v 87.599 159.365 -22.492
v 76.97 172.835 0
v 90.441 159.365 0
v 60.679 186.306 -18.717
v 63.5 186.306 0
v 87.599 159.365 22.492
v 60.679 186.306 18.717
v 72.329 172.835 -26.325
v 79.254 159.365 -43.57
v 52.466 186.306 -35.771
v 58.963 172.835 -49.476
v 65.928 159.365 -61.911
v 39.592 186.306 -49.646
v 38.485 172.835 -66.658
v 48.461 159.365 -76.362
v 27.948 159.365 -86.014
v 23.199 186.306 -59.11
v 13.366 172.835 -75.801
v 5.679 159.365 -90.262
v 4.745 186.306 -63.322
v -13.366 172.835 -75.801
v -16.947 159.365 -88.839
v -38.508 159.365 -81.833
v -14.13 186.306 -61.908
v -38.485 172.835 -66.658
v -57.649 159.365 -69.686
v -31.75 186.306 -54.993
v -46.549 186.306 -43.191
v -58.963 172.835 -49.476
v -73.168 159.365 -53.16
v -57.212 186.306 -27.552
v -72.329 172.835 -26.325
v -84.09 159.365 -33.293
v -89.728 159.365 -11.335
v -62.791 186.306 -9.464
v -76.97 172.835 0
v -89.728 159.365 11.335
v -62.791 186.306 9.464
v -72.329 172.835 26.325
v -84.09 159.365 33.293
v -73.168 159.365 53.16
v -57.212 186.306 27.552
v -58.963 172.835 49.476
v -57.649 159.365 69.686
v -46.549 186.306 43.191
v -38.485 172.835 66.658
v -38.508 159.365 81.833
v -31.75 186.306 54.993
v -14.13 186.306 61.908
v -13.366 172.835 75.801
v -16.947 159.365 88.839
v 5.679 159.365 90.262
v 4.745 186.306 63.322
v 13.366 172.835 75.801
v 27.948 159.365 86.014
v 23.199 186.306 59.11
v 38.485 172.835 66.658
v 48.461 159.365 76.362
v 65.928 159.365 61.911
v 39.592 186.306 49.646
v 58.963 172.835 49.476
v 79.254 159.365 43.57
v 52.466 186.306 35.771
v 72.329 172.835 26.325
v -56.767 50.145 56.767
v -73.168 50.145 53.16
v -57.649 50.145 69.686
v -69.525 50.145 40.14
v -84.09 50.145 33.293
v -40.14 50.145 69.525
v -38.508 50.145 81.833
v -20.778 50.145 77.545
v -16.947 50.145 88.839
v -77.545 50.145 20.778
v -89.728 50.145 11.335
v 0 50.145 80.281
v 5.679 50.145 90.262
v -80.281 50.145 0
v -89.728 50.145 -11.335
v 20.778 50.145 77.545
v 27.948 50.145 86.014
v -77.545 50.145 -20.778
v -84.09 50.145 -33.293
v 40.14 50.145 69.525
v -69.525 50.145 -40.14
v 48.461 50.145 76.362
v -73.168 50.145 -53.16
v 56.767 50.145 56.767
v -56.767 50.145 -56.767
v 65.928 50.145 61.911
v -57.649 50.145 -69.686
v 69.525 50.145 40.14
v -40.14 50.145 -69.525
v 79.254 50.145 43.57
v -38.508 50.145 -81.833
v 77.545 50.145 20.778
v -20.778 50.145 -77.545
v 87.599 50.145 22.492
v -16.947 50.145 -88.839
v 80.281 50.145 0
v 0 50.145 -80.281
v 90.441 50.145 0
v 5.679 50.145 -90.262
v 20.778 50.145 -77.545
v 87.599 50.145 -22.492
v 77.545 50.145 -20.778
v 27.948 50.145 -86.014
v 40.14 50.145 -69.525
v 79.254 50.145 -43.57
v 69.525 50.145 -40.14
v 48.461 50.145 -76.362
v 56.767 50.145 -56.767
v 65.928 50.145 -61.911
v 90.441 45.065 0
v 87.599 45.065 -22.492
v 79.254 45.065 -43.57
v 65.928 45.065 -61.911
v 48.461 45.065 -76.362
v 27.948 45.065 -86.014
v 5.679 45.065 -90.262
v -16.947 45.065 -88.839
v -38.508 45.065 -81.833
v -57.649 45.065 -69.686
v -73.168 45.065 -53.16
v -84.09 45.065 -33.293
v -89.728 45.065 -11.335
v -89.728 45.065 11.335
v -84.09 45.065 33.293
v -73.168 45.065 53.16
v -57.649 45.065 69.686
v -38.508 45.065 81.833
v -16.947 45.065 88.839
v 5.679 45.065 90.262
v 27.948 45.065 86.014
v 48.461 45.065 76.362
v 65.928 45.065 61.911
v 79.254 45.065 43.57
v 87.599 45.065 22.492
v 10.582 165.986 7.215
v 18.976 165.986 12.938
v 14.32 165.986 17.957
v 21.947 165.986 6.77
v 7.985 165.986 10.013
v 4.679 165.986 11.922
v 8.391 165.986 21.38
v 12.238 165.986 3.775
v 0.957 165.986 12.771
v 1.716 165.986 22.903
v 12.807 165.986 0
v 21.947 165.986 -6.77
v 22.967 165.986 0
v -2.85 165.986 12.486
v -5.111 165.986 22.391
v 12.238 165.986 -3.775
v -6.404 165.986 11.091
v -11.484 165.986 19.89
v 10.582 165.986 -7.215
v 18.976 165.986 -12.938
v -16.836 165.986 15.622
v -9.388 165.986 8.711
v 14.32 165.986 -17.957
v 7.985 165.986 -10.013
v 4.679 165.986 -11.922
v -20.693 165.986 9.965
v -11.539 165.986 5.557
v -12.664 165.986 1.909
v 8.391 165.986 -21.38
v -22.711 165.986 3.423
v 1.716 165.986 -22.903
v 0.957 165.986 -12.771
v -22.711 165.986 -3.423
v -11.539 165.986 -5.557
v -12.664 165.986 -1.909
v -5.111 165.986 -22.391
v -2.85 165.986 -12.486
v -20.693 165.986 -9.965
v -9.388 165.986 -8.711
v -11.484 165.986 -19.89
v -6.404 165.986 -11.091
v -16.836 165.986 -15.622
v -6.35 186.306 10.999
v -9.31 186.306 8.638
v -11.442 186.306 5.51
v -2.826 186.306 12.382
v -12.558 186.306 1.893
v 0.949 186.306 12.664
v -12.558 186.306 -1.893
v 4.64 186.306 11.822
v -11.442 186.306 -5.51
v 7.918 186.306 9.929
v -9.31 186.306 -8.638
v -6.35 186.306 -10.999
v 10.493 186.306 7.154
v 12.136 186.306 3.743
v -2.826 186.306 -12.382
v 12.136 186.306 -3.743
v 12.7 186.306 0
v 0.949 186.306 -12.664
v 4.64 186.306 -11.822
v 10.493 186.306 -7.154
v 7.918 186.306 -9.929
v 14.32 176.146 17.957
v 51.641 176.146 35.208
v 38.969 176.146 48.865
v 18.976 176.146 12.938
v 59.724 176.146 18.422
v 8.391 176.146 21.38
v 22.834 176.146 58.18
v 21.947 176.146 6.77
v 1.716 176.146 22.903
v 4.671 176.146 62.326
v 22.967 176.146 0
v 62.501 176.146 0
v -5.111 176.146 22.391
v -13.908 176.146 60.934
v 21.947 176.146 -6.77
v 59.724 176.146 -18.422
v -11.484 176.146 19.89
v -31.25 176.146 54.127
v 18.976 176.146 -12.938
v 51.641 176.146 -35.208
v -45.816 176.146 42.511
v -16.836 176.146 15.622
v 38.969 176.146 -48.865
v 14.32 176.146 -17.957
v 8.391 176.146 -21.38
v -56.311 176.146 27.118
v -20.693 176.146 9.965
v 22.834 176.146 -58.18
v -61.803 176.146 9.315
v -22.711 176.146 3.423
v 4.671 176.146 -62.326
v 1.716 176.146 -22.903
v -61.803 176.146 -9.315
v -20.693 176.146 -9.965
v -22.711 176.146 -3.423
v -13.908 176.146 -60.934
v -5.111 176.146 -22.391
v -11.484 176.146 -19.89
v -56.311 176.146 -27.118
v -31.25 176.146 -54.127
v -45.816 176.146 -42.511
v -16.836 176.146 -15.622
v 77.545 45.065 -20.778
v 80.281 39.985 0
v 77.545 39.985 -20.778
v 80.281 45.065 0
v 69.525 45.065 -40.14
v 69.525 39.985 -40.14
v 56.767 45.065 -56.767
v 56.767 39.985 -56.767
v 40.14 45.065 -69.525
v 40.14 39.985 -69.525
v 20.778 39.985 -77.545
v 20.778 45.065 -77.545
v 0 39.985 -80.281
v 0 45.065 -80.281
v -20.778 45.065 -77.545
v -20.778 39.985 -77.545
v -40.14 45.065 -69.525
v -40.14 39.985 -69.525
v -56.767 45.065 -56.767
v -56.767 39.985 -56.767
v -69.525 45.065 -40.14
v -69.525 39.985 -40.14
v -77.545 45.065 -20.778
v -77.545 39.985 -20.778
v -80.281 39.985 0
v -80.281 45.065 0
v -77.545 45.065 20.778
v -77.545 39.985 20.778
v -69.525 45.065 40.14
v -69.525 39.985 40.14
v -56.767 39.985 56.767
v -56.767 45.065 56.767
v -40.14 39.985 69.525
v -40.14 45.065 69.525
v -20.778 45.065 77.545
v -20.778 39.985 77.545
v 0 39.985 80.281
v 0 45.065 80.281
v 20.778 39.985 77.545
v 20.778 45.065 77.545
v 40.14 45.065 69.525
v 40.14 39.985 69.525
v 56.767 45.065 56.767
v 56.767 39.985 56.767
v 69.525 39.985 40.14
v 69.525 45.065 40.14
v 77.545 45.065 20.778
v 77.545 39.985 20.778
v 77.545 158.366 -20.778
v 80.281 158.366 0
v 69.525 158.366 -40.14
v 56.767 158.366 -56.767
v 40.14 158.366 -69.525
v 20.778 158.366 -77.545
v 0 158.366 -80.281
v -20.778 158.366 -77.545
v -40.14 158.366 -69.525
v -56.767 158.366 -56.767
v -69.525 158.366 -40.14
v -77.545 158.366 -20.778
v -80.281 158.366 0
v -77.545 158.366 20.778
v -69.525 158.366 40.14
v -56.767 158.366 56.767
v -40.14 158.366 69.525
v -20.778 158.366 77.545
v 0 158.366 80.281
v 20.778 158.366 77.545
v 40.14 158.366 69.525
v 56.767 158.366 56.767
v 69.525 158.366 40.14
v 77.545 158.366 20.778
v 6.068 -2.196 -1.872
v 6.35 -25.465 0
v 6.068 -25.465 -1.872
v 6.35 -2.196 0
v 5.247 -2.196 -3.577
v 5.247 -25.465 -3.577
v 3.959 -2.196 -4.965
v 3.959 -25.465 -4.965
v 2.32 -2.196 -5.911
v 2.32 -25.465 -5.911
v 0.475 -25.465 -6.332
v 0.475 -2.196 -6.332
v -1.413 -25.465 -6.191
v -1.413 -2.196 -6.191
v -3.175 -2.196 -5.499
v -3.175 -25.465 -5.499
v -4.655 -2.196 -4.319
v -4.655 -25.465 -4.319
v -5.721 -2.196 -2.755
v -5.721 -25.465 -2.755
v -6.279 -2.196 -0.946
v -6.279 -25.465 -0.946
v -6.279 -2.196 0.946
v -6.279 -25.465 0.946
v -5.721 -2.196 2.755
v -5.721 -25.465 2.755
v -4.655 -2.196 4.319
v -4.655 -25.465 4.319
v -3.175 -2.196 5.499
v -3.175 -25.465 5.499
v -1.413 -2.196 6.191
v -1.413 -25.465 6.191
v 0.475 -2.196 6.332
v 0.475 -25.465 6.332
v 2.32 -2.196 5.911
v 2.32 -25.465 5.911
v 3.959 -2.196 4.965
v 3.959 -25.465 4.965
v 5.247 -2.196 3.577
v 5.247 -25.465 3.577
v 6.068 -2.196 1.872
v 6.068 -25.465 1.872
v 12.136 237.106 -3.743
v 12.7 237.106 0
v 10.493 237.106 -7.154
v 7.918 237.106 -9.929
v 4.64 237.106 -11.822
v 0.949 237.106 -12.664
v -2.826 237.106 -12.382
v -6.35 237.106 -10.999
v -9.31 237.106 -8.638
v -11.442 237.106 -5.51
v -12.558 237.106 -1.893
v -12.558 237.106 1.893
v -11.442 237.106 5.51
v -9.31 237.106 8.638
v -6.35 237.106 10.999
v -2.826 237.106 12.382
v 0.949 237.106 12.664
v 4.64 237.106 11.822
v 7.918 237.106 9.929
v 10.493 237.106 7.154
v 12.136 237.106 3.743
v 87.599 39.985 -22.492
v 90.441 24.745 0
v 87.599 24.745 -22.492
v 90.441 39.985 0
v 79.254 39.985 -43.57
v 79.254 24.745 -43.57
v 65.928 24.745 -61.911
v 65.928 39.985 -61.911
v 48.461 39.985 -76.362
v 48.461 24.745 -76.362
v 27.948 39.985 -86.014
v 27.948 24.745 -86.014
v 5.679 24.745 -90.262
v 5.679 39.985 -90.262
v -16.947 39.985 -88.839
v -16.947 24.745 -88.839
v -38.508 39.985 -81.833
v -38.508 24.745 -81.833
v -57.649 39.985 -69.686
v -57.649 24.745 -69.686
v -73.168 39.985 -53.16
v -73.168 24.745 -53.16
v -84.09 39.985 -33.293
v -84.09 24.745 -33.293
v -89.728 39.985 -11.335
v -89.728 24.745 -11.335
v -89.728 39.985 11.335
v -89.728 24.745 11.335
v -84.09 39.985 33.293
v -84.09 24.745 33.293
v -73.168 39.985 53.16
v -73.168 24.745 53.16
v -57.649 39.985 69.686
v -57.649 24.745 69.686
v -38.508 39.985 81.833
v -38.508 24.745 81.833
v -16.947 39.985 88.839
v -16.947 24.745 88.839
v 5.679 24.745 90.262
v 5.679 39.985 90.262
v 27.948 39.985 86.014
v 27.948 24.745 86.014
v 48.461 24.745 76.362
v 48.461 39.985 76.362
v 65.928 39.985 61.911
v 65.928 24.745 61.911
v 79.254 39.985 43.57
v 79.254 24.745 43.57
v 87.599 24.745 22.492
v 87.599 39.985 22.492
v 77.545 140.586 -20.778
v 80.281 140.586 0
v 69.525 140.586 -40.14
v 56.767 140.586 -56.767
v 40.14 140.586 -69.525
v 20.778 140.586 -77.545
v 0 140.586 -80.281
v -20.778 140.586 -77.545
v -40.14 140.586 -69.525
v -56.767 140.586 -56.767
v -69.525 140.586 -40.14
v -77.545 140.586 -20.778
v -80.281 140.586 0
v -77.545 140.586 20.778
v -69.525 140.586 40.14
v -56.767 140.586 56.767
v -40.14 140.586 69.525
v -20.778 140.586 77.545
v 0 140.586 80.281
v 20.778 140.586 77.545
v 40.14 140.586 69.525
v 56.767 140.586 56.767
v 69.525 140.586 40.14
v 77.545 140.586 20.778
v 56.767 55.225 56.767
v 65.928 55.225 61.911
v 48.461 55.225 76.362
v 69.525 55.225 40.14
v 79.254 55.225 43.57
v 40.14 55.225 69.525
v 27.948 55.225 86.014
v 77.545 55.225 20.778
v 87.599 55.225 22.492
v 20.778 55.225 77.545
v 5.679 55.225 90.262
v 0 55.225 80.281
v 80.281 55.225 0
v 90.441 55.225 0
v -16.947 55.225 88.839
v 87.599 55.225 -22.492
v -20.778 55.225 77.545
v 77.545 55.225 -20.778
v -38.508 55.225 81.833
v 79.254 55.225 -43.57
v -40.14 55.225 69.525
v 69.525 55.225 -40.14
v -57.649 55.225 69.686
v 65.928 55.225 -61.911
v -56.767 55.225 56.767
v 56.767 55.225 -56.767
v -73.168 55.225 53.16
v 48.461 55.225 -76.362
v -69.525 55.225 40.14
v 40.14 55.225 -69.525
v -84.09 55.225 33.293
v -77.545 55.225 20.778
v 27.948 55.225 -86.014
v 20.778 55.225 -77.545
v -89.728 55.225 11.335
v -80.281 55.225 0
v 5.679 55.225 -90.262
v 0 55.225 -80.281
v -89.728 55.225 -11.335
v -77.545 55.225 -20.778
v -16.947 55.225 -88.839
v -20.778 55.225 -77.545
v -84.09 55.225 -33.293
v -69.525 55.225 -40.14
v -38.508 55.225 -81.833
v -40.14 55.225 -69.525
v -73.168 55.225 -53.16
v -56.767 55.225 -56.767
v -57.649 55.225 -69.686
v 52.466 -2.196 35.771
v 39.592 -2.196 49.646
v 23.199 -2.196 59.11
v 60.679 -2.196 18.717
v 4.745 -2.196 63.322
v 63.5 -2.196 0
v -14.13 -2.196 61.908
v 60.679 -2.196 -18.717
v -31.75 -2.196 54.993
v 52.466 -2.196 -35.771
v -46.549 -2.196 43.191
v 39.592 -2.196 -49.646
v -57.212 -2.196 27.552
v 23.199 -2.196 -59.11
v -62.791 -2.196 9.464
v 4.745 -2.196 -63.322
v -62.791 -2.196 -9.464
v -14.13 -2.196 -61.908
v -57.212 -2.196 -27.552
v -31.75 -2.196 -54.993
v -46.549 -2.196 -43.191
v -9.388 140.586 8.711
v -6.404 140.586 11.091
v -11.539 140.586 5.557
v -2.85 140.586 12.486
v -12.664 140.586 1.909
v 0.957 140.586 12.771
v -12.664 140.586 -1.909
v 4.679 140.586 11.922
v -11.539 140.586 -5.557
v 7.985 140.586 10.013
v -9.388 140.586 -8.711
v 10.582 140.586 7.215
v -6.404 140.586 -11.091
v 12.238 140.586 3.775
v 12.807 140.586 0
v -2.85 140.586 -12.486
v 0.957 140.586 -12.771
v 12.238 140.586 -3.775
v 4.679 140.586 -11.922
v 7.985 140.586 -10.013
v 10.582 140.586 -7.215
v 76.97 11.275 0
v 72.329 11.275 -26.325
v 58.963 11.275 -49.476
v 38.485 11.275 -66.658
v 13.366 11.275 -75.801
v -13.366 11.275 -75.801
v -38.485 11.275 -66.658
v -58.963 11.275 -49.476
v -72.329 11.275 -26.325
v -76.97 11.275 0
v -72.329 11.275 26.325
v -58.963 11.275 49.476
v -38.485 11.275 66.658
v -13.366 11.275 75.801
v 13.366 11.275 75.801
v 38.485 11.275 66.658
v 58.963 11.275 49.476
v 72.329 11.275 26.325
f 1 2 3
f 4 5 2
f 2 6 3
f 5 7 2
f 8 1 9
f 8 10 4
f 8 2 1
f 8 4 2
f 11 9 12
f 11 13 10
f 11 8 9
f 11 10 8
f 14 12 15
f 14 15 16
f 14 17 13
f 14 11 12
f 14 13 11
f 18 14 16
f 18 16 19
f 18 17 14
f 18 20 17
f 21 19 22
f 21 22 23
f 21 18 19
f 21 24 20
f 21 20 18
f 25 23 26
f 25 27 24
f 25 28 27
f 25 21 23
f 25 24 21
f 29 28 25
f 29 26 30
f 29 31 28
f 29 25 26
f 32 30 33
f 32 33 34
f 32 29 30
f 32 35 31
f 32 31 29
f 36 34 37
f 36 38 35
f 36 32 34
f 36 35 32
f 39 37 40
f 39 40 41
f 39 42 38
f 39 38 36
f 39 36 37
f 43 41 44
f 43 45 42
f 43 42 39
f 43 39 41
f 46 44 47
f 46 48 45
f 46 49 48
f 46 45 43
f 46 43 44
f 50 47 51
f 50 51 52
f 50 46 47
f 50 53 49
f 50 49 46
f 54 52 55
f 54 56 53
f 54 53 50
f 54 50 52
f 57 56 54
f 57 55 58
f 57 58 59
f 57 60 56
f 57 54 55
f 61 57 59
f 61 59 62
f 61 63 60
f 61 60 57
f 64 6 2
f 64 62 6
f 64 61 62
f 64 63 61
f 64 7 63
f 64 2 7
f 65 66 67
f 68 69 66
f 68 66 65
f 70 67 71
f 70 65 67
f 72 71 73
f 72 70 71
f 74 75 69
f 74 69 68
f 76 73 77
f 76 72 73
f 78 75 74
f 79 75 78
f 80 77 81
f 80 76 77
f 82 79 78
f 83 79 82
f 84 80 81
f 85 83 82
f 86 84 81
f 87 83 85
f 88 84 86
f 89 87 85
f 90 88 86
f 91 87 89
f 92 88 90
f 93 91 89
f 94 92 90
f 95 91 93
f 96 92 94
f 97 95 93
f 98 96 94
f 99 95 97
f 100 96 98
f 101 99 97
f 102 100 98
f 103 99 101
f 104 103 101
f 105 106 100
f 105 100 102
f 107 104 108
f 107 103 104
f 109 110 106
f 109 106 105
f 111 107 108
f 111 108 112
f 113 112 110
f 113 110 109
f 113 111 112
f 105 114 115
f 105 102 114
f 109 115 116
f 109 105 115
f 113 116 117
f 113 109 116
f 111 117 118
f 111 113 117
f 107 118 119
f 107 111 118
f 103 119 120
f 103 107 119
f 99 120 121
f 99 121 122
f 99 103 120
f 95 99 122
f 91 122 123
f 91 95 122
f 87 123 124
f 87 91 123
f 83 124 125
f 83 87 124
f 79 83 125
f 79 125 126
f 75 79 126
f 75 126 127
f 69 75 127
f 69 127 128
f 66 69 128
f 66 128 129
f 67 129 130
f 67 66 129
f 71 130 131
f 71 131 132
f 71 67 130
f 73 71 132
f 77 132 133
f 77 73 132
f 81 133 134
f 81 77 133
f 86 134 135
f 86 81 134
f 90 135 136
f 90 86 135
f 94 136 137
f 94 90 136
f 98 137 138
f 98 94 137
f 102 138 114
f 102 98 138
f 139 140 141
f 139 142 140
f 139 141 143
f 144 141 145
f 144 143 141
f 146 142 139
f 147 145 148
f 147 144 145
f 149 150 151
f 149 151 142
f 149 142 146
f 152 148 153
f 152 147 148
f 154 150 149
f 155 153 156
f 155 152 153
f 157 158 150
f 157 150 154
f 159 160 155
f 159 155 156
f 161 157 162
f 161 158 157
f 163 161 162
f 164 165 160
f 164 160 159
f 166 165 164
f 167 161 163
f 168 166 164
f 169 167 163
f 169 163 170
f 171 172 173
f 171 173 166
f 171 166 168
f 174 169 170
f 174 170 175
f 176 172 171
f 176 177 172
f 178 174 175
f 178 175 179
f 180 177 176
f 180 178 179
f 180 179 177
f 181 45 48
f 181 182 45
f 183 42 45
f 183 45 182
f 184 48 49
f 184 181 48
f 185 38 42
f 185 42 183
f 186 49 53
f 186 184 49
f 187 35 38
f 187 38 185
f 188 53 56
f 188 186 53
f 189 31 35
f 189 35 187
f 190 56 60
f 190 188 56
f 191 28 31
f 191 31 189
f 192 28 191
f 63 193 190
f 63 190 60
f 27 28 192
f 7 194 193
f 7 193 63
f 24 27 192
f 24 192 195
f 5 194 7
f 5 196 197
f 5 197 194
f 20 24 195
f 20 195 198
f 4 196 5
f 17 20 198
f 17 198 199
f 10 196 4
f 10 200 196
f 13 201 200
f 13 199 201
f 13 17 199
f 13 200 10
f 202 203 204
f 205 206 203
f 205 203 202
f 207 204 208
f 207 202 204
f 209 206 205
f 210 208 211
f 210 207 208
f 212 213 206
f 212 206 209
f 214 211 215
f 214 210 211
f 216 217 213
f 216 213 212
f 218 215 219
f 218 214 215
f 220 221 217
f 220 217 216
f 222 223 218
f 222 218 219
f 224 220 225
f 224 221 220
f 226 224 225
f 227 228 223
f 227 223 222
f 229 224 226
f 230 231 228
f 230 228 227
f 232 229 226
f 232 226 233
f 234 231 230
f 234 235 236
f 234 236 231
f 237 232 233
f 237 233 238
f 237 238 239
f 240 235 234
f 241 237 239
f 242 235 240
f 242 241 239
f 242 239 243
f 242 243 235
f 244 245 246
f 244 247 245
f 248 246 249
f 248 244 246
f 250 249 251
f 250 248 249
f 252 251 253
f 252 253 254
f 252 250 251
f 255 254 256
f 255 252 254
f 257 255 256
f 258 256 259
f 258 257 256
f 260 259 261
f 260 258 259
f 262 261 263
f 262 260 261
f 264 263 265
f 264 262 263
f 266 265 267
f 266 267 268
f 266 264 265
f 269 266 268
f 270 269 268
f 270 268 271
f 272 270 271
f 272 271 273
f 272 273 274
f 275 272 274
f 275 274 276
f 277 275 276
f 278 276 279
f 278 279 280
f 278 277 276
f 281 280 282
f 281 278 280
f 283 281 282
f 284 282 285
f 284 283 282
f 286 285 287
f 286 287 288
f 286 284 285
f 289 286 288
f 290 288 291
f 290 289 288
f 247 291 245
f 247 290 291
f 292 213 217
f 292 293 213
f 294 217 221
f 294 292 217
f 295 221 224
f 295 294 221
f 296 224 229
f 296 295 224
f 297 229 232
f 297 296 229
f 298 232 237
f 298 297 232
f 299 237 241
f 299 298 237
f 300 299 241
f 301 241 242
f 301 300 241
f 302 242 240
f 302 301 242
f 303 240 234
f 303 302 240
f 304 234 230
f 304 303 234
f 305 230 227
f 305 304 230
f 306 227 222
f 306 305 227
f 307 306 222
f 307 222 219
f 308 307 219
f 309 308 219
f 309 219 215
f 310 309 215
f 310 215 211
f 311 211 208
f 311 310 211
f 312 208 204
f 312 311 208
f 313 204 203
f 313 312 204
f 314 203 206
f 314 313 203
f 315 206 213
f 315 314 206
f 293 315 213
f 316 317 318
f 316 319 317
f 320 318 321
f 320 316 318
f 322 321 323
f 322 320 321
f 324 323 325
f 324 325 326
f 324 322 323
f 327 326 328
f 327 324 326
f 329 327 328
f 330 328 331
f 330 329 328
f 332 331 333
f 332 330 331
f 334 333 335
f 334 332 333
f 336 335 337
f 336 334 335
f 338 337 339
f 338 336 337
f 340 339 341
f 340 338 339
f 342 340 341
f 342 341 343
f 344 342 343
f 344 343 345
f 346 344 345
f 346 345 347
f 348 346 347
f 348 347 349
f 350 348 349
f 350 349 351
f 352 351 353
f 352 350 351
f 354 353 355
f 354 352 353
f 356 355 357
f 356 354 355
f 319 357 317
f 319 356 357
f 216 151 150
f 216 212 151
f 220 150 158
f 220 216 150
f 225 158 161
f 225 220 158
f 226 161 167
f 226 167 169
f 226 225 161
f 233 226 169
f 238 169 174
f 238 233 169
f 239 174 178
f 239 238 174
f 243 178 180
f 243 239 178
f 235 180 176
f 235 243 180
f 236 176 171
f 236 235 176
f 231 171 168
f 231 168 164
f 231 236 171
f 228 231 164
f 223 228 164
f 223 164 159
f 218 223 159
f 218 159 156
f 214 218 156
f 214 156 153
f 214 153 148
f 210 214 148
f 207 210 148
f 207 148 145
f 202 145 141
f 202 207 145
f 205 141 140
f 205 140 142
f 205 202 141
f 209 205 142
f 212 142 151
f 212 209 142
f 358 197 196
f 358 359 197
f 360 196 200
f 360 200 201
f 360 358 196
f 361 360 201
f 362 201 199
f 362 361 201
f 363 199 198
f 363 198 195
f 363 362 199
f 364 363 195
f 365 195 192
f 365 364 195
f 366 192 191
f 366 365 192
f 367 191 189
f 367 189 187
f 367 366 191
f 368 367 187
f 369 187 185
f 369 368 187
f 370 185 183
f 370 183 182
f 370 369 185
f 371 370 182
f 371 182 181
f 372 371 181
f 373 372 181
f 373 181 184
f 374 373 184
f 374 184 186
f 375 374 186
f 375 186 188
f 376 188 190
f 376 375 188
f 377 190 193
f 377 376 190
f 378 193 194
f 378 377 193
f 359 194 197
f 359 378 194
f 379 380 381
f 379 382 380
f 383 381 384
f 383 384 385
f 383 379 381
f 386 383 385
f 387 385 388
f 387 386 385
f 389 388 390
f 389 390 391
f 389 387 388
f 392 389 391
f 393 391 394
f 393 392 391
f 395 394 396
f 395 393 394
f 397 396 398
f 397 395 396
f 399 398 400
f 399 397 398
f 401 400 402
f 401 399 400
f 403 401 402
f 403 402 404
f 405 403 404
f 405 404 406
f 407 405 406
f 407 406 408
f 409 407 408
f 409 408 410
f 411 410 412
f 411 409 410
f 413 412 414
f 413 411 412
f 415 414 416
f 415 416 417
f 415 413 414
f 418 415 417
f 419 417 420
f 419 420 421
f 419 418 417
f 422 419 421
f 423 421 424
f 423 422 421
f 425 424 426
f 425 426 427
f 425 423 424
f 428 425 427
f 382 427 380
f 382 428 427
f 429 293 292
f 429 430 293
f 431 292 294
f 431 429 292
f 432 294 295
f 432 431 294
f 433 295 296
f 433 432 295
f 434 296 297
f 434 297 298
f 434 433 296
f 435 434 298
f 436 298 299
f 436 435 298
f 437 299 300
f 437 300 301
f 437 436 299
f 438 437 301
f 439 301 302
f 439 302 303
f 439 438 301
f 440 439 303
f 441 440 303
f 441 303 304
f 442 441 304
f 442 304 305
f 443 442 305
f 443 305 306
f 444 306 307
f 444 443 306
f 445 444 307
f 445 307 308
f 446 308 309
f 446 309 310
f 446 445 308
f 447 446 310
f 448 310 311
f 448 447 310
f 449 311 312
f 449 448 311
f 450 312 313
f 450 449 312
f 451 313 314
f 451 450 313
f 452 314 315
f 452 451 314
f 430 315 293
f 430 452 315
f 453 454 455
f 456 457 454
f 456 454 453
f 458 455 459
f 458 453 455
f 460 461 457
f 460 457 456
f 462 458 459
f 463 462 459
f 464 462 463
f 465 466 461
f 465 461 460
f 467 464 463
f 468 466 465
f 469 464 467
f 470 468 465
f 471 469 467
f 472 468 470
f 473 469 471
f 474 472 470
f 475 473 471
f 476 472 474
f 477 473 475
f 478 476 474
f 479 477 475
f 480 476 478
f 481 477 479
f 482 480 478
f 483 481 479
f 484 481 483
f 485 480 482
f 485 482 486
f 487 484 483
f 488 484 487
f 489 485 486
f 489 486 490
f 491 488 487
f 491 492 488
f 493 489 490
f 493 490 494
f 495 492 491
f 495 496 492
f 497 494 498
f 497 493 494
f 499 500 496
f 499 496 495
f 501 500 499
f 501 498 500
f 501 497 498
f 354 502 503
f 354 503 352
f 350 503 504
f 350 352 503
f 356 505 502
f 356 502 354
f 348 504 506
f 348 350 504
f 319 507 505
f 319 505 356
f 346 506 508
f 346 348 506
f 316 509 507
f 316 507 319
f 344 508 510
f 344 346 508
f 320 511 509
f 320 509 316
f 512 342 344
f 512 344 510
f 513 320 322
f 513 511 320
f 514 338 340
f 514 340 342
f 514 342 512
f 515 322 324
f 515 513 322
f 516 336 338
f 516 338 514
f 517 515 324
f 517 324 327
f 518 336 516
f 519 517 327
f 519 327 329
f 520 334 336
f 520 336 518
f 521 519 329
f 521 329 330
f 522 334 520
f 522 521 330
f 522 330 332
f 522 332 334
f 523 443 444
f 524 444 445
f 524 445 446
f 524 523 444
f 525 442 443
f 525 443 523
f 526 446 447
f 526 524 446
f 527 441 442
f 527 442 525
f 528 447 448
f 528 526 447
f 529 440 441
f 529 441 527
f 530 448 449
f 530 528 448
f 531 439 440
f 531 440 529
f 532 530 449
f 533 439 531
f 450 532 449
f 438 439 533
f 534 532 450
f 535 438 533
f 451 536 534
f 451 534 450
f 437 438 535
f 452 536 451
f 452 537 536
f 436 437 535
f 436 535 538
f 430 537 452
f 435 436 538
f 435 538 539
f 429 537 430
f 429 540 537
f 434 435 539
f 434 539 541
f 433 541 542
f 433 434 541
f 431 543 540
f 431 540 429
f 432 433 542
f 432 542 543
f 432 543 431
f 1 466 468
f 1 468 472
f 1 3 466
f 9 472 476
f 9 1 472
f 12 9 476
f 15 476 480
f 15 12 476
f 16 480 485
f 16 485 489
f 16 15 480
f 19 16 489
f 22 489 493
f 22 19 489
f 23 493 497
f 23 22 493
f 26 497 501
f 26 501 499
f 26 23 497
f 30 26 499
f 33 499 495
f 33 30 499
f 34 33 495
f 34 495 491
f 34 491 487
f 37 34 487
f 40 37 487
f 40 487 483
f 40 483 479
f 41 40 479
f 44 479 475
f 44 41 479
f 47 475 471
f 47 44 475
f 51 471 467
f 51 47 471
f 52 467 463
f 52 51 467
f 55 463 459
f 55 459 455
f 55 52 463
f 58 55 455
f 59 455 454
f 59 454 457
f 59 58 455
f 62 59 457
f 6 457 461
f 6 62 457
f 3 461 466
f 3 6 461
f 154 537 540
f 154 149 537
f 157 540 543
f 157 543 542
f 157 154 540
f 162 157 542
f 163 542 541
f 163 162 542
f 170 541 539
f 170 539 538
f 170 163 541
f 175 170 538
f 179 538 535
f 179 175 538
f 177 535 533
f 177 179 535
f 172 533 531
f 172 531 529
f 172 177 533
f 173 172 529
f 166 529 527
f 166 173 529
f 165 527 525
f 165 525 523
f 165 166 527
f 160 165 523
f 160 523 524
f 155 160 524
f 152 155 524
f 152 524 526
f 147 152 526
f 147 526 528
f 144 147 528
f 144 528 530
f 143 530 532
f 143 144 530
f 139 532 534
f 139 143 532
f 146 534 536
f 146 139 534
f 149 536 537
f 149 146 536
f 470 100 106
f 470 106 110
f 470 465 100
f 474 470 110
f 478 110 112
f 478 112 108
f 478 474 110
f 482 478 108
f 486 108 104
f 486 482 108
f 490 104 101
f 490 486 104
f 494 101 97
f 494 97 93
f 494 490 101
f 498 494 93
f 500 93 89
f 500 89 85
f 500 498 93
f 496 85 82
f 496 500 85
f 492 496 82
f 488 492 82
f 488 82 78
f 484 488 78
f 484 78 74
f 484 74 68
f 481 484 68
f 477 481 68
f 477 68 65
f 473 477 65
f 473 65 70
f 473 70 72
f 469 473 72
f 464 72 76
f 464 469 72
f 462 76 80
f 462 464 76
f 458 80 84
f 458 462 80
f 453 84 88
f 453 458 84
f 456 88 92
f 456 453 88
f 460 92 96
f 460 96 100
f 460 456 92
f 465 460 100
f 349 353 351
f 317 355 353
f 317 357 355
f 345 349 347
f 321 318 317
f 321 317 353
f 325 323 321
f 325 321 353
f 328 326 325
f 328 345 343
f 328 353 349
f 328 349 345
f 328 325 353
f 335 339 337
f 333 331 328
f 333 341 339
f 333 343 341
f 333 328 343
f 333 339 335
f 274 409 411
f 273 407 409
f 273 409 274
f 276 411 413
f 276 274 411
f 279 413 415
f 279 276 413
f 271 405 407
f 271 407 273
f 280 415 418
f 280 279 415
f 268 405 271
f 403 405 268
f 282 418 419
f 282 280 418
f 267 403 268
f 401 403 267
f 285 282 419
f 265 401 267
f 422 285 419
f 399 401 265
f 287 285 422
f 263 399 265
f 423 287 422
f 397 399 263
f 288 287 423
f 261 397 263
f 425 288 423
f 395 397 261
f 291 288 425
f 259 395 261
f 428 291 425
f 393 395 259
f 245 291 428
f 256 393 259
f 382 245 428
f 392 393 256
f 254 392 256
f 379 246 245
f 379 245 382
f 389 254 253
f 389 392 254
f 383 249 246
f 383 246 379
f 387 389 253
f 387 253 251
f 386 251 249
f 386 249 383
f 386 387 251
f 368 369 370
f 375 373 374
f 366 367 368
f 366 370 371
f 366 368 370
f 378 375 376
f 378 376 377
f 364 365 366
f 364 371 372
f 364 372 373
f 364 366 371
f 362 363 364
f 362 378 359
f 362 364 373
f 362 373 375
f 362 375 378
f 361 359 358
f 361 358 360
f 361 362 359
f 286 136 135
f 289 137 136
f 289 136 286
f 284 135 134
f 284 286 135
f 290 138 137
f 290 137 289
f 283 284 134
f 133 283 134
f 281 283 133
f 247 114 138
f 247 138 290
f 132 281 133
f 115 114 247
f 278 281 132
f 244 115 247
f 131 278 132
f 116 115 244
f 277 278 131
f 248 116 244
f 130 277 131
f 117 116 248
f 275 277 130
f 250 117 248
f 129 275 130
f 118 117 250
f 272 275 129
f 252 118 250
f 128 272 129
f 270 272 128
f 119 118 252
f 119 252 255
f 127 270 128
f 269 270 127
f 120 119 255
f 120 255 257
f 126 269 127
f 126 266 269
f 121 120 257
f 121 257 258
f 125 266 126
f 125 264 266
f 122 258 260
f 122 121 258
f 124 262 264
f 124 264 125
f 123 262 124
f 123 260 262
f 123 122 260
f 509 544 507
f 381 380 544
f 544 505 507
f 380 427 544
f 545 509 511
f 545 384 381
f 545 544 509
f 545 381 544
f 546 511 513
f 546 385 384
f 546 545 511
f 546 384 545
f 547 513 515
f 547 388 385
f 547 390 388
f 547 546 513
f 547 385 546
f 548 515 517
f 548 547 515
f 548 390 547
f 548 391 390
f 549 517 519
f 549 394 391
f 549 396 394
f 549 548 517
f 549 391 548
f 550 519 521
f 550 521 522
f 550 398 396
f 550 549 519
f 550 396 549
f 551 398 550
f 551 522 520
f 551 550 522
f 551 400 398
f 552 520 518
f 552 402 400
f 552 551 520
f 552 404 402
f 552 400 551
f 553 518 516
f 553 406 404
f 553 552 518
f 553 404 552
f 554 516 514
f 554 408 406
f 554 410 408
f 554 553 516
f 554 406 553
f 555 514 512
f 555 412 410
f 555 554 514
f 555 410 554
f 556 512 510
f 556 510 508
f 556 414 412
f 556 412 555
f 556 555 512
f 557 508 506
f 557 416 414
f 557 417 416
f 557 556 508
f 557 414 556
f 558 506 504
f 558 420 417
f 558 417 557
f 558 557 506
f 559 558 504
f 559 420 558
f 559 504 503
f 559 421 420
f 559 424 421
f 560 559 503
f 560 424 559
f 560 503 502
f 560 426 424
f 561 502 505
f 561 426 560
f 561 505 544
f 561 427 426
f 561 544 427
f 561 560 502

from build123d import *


with BuildPart() as part:
    # Sketch1 → Revolve1 (revolve)
    with BuildSketch(Plane.XY):
        Polygon((6.35, -2.195764302), (63.5, -2.195764302), (90.440768363, 24.745004061), (90.440768363, 39.985004061), (80.280768363, 39.985004061), (80.280768363, 45.065004061), (90.440768363, 45.065004061), (90.440768363, 50.145004061), (80.280768363, 50.145004061), (80.280768363, 55.225004061), (90.440768363, 55.225004061), (90.440768363, 159.365004061), (63.5, 186.305772424), (12.7, 186.305772424), (12.7, 237.105772424), (0, 237.105772424), (0, 0), (0, -25.4650148), (6.35, -25.4650148), align=None)
        Polygon((22.967294816, 176.145772424), (62.500768363, 176.145772424), (80.280768363, 158.365772424), (80.280768363, 140.585772424), (12.807294816, 140.585772424), (12.807294816, 165.985772424), (22.967294816, 165.985772424), align=None, mode=Mode.SUBTRACT)
    revolve(axis=Axis((0, 237.105772424, 0), (0, 1, 0)))


solid = part.part
